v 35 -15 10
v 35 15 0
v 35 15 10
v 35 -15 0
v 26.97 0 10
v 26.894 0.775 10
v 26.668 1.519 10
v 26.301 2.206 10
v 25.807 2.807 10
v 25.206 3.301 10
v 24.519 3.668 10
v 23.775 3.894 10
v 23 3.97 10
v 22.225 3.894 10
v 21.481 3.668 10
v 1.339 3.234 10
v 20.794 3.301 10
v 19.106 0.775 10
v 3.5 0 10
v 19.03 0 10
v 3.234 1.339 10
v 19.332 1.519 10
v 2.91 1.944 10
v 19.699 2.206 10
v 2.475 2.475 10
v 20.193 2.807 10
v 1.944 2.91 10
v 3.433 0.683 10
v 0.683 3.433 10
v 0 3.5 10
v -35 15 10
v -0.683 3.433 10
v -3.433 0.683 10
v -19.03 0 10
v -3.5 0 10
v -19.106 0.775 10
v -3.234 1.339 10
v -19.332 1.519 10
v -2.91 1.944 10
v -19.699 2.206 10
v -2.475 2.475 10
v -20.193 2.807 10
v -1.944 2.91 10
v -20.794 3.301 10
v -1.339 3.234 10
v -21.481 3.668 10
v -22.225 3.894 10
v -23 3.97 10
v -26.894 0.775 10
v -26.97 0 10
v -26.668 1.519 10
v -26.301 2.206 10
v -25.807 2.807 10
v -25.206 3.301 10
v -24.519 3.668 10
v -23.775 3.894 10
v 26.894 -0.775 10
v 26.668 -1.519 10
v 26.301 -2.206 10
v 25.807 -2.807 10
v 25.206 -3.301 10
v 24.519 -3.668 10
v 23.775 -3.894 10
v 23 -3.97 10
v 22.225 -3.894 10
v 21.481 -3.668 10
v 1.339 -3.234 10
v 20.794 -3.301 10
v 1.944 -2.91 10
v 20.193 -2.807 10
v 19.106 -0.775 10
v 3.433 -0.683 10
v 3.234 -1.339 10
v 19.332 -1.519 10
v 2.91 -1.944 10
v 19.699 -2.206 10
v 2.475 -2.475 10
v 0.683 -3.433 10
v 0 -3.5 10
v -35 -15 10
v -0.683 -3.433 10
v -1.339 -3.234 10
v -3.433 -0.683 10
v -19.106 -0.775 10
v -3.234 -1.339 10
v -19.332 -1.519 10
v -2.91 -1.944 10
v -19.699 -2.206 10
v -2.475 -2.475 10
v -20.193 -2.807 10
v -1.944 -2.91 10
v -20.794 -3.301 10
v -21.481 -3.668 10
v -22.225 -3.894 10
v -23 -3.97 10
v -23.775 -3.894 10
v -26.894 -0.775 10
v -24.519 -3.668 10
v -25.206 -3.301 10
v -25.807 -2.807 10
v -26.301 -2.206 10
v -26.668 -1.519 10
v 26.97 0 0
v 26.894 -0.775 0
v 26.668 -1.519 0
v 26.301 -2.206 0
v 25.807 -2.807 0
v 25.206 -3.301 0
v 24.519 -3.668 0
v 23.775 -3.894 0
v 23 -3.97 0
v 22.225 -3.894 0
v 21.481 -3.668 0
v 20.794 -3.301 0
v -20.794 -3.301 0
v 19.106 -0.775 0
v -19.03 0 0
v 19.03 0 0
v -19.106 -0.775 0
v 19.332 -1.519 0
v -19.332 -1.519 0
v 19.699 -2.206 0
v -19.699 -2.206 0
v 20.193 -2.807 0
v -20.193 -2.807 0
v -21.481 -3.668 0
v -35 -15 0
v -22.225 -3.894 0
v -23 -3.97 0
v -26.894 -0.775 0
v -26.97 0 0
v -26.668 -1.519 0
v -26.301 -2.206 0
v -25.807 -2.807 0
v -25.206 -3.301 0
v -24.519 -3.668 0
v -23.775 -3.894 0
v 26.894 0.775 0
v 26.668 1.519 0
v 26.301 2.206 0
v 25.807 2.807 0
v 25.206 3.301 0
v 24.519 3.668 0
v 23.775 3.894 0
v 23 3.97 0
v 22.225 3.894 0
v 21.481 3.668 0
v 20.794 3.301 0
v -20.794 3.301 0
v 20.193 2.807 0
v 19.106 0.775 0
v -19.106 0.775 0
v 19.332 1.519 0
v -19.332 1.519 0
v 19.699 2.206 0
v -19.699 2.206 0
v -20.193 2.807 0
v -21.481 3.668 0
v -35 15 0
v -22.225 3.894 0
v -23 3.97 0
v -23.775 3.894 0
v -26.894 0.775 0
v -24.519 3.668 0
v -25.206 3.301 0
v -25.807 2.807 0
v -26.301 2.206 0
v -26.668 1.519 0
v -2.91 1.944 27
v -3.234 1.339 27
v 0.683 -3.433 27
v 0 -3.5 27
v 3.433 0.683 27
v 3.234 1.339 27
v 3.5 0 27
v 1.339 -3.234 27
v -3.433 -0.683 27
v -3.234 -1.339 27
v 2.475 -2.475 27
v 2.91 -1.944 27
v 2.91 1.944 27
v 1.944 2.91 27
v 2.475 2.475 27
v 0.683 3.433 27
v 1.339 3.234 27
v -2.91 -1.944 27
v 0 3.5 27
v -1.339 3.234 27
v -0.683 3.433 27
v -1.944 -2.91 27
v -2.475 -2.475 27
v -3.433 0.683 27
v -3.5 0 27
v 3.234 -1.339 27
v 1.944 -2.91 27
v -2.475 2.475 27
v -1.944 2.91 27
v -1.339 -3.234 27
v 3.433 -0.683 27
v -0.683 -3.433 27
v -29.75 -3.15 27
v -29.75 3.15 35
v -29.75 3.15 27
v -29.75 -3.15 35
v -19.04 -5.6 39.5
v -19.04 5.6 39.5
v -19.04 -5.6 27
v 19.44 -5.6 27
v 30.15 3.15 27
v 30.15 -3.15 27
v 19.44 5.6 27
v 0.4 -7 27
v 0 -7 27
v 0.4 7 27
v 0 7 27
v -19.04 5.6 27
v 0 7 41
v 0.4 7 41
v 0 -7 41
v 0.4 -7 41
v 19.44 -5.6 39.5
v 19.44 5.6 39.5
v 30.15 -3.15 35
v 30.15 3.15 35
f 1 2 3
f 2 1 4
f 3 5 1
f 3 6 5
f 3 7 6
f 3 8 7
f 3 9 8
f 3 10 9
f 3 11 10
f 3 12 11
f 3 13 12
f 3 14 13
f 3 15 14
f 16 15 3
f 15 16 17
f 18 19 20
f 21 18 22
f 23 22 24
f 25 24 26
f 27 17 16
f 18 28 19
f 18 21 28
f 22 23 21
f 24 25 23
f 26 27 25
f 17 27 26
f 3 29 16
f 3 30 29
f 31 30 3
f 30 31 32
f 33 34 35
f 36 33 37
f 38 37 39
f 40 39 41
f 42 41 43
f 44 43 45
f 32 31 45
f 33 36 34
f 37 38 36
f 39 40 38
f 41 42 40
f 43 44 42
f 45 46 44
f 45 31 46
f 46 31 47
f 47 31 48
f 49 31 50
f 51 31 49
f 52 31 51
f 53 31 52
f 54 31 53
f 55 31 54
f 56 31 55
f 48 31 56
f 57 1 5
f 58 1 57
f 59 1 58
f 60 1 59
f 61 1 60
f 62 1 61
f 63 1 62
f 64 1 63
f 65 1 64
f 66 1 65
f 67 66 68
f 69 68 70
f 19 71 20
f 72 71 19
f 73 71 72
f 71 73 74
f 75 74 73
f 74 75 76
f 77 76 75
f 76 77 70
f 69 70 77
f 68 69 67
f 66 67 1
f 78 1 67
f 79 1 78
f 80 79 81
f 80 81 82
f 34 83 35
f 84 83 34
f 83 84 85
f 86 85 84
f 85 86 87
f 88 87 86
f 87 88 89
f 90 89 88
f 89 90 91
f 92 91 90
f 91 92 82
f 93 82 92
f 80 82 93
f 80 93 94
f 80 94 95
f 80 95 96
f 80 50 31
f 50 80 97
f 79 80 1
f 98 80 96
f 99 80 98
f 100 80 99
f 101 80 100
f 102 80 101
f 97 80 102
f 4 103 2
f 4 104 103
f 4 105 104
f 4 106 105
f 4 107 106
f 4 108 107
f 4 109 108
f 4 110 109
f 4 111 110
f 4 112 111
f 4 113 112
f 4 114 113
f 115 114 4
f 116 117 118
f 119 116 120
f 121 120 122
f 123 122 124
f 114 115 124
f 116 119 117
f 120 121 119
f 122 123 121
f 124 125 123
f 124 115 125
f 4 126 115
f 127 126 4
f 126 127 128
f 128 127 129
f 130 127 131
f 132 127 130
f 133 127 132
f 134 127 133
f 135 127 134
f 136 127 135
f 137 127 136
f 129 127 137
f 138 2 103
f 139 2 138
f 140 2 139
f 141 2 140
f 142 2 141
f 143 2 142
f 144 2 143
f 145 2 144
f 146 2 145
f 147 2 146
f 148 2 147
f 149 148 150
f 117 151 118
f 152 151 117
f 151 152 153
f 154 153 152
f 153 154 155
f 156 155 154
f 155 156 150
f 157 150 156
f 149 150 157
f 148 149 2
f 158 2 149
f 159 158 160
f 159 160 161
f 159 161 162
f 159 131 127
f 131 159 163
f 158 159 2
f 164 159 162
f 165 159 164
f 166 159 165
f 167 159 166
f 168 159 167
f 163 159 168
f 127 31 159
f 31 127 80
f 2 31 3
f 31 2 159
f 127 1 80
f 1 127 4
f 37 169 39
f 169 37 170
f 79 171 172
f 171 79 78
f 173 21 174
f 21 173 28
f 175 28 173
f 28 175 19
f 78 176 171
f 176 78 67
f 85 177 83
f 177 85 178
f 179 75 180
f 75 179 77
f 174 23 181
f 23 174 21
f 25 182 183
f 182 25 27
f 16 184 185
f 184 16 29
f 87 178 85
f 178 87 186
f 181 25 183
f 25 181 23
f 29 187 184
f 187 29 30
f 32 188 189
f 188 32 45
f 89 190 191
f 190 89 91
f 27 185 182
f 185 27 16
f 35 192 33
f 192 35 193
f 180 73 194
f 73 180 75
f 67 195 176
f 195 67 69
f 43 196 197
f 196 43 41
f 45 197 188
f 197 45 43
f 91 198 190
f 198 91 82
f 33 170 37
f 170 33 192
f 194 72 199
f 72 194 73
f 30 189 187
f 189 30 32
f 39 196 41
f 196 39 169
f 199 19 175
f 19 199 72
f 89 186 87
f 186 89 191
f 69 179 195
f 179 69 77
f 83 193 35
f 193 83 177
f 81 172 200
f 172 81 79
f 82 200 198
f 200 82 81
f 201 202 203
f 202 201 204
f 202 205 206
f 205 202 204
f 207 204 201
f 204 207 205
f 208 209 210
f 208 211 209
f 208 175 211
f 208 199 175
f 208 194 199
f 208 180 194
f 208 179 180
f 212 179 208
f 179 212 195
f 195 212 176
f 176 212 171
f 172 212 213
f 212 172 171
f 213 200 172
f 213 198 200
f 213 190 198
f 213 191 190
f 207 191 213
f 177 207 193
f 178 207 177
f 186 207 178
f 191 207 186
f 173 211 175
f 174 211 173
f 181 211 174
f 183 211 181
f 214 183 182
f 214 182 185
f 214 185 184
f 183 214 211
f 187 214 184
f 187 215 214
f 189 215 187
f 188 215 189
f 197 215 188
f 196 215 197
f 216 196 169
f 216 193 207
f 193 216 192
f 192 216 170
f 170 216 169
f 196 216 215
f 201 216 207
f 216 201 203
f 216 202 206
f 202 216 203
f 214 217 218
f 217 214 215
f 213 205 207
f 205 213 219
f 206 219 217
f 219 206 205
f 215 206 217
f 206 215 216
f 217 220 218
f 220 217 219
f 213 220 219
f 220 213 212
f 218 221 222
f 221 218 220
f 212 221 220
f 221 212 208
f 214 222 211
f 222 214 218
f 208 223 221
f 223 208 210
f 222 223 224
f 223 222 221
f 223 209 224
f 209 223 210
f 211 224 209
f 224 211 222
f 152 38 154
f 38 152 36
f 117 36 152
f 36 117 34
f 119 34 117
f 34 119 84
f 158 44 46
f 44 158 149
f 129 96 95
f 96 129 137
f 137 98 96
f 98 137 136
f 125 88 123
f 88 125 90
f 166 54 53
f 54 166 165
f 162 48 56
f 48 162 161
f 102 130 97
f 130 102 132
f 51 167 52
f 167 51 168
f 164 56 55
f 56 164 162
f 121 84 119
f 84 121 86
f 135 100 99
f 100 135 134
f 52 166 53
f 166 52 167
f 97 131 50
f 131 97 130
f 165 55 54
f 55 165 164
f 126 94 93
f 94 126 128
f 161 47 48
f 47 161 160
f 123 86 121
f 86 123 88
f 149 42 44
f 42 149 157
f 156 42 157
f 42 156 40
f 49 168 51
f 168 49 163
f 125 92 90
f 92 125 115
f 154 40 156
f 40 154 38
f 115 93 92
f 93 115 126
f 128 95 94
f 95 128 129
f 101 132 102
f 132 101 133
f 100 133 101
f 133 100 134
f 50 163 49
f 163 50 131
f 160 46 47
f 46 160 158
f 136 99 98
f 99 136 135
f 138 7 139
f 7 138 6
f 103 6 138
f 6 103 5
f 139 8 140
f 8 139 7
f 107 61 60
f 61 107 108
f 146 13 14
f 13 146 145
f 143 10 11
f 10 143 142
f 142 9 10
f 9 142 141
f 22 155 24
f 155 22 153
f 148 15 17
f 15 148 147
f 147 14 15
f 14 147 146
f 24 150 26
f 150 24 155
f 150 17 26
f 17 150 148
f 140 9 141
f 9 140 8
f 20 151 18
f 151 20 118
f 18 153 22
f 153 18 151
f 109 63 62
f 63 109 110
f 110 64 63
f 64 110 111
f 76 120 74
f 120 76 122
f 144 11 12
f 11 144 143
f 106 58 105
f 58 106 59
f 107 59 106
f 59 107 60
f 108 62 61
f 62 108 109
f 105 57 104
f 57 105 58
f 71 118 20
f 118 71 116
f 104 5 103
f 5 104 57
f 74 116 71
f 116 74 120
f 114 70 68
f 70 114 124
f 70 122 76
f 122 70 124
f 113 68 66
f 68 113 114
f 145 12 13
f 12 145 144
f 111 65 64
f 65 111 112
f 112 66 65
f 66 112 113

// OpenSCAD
$fn = 32;

// ----------------------------------------------------------------------
// Boat cleat: 70 mm base, horn 34 mm up
// ----------------------------------------------------------------------

// --- parameters (mm) ---
base_l = 70;              // base length
base_w = 30;              // base width
base_t = 10;              // base thickness
horn_len = 59.5;          // horn length
horn_d = 14;              // horn diameter at the middle
horn_z = 34;              // horn axis height
end_drop = 6;             // how far the horn tips drop
post_d = 7;               // centre post diameter
holes_d = 7.94;           // fixing holes
hole_x = 23;              // fixing hole spacing

difference() {
  union() {
    translate([-35, -15, 0]) cube([base_l, base_w, base_t]);
    /* centre post, sunk 1 mm into the base */
    translate([0, 0, 9]) cylinder(h = 25, d = post_d);
    /* horn: a hull chain of boxes, full in the middle and lighter at the tips */
    hull() {
      translate([-29.75, -3.15, 27]) cube([0.4, 6.3, 8], center = false);
      translate([-19.04, -5.6, 27]) cube([0.4, 11.2, 12.5], center = false);
    }
    hull() {
      translate([-19.04, -5.6, 27]) cube([0.4, 11.2, 12.5], center = false);
      translate([0, -7, 27]) cube([0.4, 14, 14], center = false);
    }
    hull() {
      translate([0, -7, 27]) cube([0.4, 14, 14], center = false);
      translate([19.04, -5.6, 27]) cube([0.4, 11.2, 12.5], center = false);
    }
    hull() {
      translate([19.04, -5.6, 27]) cube([0.4, 11.2, 12.5], center = false);
      translate([29.75, -3.15, 27]) cube([0.4, 6.3, 8], center = false);
    }
  }
  translate([-23, 0, -2.5]) cylinder(h = base_t + 5, d = holes_d);
  translate([23, 0, -2.5]) cylinder(h = base_t + 5, d = holes_d);
}
